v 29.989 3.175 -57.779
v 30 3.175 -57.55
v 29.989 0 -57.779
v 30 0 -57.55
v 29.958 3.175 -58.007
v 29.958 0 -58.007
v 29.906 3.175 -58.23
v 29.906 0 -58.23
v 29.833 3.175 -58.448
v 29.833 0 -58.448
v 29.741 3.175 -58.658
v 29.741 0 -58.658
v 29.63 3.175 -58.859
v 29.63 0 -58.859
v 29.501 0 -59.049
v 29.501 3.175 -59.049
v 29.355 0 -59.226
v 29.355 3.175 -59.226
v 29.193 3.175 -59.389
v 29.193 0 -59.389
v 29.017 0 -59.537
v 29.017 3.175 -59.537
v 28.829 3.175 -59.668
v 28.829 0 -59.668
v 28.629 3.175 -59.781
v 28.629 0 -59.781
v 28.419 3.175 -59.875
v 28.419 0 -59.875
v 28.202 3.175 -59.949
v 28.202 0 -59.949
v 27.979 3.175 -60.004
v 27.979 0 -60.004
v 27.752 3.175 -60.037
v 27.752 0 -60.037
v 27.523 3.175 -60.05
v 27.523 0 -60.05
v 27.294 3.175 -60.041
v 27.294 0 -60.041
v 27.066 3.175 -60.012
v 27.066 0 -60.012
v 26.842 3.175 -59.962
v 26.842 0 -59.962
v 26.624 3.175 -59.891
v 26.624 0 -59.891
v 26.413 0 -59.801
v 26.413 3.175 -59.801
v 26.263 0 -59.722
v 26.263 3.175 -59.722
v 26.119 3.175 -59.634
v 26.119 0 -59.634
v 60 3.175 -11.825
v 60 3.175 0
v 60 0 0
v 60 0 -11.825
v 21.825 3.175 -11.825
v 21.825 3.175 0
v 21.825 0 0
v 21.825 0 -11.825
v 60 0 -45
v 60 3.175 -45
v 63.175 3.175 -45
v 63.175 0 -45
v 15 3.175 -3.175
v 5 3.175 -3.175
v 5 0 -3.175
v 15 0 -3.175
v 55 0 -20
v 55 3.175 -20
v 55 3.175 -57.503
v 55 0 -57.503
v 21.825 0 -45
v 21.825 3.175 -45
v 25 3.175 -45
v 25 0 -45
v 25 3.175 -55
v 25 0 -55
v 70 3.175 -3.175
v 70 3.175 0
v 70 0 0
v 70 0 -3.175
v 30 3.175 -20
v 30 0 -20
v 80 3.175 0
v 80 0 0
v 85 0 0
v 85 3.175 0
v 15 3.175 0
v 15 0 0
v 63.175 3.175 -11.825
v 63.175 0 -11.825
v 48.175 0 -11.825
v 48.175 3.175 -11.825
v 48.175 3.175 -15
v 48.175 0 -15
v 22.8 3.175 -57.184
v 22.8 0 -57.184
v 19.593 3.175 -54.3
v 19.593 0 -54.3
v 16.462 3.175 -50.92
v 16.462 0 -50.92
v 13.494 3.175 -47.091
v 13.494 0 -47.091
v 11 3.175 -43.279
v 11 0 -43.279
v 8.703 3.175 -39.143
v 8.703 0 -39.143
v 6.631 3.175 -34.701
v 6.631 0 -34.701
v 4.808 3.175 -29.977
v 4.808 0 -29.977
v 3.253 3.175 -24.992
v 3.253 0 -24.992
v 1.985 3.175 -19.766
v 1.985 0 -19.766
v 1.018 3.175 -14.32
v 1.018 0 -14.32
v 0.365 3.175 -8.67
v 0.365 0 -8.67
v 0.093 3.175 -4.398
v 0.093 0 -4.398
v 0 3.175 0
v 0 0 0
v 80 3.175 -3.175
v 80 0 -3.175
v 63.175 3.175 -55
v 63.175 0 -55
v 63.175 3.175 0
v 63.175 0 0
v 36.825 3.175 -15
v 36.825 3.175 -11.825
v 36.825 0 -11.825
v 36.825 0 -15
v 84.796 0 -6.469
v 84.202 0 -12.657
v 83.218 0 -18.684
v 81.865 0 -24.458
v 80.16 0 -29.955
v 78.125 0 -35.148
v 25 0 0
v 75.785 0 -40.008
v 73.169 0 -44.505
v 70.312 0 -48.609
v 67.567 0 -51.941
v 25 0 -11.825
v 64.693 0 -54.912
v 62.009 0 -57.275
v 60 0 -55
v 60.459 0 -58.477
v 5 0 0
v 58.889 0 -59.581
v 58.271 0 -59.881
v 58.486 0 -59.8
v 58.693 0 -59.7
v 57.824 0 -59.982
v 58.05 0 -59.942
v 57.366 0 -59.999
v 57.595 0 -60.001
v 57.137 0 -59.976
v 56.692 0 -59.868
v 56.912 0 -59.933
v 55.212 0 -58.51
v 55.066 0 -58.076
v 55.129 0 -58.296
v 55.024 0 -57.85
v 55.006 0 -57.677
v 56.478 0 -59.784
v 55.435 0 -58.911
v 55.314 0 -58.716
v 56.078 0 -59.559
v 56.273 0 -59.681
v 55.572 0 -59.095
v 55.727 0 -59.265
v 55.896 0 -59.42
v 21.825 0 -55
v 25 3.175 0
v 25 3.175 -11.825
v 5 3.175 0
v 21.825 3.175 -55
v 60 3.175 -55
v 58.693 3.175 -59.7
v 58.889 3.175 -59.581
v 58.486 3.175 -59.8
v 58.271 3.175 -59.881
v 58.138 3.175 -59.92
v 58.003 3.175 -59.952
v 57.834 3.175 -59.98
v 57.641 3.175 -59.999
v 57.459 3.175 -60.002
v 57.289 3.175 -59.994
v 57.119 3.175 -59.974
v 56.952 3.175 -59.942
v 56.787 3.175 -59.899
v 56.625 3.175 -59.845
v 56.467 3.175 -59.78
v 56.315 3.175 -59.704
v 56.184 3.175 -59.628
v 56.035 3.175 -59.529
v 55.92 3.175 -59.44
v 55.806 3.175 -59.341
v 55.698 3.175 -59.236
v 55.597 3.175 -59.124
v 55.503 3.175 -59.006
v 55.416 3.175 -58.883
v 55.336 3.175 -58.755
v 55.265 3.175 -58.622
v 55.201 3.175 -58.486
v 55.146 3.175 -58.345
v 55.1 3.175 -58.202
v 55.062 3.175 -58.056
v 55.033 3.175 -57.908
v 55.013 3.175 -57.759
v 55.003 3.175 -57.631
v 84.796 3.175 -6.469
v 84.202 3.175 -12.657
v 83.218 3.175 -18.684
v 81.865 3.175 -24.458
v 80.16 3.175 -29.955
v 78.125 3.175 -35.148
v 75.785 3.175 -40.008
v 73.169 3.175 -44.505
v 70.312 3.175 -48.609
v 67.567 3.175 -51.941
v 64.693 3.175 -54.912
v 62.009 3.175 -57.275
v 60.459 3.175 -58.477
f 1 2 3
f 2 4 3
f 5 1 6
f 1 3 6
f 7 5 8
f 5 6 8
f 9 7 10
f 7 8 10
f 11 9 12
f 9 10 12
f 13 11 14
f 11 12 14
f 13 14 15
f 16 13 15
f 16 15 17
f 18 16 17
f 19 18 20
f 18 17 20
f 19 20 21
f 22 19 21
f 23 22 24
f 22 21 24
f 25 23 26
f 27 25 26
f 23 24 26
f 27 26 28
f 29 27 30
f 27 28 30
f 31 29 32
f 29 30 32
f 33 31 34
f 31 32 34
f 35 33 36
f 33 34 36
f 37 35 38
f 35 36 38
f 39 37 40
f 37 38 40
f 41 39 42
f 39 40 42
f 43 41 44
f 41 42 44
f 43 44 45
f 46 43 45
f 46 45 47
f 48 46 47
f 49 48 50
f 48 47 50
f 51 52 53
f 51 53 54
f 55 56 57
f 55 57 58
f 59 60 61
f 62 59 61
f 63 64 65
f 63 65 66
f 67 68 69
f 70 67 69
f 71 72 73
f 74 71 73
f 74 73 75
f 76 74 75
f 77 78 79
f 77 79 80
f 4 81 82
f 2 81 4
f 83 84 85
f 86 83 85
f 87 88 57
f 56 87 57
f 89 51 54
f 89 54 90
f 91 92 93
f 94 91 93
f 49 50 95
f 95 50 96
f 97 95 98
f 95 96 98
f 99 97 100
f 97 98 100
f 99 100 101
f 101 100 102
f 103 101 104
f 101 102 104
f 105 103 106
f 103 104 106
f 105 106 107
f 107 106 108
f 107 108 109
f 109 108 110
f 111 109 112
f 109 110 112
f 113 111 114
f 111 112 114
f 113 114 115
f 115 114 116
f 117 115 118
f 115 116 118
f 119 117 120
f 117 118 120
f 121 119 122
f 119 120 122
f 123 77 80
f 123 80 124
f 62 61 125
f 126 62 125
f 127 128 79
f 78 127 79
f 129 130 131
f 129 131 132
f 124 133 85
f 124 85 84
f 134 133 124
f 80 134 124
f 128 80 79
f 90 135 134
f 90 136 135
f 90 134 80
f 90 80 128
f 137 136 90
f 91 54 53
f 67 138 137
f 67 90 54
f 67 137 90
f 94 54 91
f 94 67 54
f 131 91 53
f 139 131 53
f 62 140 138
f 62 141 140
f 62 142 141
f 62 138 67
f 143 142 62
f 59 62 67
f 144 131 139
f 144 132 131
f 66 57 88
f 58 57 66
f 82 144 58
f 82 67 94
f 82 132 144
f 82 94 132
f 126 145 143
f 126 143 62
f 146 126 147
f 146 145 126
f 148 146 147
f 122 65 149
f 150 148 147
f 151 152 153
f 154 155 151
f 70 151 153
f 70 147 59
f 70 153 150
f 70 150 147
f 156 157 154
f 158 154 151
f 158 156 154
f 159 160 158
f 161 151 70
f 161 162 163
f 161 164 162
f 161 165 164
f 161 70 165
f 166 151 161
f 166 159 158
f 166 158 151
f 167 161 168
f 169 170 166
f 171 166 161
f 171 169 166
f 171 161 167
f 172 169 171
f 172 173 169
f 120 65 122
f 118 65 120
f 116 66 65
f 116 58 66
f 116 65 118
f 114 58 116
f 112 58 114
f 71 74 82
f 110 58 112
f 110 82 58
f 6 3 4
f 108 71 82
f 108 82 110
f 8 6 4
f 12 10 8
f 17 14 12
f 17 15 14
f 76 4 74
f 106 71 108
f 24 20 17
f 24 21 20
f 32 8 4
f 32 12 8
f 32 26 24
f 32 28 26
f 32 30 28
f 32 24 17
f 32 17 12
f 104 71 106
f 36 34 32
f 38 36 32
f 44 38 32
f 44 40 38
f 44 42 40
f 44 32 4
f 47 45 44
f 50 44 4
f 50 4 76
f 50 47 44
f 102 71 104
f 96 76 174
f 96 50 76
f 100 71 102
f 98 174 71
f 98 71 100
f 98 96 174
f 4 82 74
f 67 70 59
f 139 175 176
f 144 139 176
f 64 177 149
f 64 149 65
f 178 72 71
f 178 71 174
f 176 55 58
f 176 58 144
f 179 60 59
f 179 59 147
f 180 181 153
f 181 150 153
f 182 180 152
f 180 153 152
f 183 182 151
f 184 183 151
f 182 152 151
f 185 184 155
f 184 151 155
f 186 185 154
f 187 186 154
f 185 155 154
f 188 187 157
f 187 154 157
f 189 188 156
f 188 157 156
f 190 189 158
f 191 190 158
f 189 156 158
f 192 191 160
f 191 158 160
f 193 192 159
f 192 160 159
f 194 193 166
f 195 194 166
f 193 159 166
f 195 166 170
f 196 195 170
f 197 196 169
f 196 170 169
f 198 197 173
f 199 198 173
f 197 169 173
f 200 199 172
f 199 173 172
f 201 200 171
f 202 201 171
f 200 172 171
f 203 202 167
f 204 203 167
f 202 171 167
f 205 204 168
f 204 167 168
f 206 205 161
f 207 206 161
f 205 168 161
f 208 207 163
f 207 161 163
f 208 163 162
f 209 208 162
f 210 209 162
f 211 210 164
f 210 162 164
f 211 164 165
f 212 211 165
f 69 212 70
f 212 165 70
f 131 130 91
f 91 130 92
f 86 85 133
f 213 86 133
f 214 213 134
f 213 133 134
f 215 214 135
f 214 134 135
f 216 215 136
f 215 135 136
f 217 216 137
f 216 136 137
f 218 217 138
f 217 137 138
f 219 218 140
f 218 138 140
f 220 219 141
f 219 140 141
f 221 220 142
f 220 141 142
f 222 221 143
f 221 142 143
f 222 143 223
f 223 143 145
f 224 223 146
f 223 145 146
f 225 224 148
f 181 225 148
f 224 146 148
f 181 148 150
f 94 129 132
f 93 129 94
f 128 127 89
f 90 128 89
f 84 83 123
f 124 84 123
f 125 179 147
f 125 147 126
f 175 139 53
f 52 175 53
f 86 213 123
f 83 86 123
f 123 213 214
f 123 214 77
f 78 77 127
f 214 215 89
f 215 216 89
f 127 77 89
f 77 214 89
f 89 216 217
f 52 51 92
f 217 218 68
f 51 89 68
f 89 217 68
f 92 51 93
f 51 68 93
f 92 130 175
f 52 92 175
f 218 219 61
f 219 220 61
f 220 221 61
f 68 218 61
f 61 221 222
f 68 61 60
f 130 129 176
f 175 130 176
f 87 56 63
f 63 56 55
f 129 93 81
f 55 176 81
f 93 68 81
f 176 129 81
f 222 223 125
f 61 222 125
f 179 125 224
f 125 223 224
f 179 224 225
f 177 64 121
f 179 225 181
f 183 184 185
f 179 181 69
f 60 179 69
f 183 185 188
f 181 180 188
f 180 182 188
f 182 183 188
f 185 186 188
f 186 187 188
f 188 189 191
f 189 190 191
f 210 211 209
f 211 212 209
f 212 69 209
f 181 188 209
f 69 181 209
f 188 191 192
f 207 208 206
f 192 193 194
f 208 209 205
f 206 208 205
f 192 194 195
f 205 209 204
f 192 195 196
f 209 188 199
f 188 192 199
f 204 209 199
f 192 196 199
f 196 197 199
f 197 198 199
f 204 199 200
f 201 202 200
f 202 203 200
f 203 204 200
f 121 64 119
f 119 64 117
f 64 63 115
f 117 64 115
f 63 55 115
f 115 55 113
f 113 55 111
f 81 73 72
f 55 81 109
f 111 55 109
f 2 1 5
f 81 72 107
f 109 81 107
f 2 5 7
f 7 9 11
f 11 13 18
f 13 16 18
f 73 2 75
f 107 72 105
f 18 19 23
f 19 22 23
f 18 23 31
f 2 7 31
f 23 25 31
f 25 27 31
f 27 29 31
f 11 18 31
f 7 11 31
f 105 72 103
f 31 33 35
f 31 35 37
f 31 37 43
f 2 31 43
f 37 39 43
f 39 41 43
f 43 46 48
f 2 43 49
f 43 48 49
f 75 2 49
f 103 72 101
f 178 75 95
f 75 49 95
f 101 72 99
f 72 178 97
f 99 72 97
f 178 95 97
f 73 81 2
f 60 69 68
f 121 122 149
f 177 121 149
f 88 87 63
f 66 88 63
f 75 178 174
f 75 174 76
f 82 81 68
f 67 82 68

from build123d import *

# Parameters (mm, degrees)
BOSS_EXTRUDE1_DEPTH = 3.175
SKETCH3_W           = 3.175
SKETCH3_H           = 11.825
SKETCH3_W_2         = 11.35
SKETCH3_H_2         = 3.175
SKETCH3_W_3         = 25
SKETCH3_H_3         = 49.488701784
SKETCH3_H_4         = 10
SKETCH3_W_4         = 10
CUT_EXTRUDE2_DEPTH  = 4.1750001
FILLET1_R           = 2.5


with BuildPart() as part:
    # Sketch1 → Boss-Extrude1 (new body)
    with BuildSketch(Plane(origin=(0, 0, 0), x_dir=(1, 0, 0), z_dir=(0, 1, 0))):
        with BuildLine():
            add(Edge.make_bspline(
                [(0, 0), (0, 36), (20.385499073, 62.552567554), (40.487505944, 65), (42.5, 65)],
                knots=[0, 0, 0, 0, 0.452811163, 0.503123514, 0.503123514, 0.503123514, 0.503123514], degree=3))
            Line((0, 0), (42.5, 0))
            Line((42.5, 0), (42.5, 65))
        make_face()
        with BuildLine():
            Line((42.5, 65), (42.5, 0))
            Line((42.5, 0), (85, 0))
            add(Edge.make_bspline(
                [(42.5, 65), (44.487505944, 65), (64.384933097, 62.612967274), (85, 36), (85, 0)],
                knots=[0.503123514, 0.503123514, 0.503123514, 0.503123514, 0.552811163, 1, 1, 1, 1], degree=3))
        make_face()
    extrude(amount=BOSS_EXTRUDE1_DEPTH)

    # Sketch3 → Cut-Extrude2 (cut, through all)
    with BuildSketch(Plane(origin=(0, 3.175, 0), x_dir=(1, 0, 0), z_dir=(0, 1, 0))):
        with Locations((23.4125, 5.9125)):
            Rectangle(SKETCH3_W, SKETCH3_H)
        with Locations((61.5875, 5.9125)):
            Rectangle(SKETCH3_W, SKETCH3_H)
        with Locations((42.5, 13.4125)):
            Rectangle(SKETCH3_W_2, SKETCH3_H_2)
        with Locations((42.5, 44.744350892)):
            Rectangle(SKETCH3_W_3, SKETCH3_H_3)
        with Locations((23.4125, 50)):
            Rectangle(SKETCH3_W, SKETCH3_H_4)
        with Locations((61.5875, 50)):
            Rectangle(SKETCH3_W, SKETCH3_H_4)
        with Locations((10, 1.5875)):
            Rectangle(SKETCH3_W_4, SKETCH3_H_2)
        with Locations((75, 1.5875)):
            Rectangle(SKETCH3_W_4, SKETCH3_H_2)
    extrude(amount=-CUT_EXTRUDE2_DEPTH, mode=Mode.SUBTRACT)

    # Fillet1
    fillet1_edges = [part.edges().sort_by_distance(p)[0] for p in [
        (30, 1.5875, -61.882691036),
        (55, 1.5875, -61.855383827),
    ]]
    fillet(fillet1_edges, radius=FILLET1_R)


solid = part.part
